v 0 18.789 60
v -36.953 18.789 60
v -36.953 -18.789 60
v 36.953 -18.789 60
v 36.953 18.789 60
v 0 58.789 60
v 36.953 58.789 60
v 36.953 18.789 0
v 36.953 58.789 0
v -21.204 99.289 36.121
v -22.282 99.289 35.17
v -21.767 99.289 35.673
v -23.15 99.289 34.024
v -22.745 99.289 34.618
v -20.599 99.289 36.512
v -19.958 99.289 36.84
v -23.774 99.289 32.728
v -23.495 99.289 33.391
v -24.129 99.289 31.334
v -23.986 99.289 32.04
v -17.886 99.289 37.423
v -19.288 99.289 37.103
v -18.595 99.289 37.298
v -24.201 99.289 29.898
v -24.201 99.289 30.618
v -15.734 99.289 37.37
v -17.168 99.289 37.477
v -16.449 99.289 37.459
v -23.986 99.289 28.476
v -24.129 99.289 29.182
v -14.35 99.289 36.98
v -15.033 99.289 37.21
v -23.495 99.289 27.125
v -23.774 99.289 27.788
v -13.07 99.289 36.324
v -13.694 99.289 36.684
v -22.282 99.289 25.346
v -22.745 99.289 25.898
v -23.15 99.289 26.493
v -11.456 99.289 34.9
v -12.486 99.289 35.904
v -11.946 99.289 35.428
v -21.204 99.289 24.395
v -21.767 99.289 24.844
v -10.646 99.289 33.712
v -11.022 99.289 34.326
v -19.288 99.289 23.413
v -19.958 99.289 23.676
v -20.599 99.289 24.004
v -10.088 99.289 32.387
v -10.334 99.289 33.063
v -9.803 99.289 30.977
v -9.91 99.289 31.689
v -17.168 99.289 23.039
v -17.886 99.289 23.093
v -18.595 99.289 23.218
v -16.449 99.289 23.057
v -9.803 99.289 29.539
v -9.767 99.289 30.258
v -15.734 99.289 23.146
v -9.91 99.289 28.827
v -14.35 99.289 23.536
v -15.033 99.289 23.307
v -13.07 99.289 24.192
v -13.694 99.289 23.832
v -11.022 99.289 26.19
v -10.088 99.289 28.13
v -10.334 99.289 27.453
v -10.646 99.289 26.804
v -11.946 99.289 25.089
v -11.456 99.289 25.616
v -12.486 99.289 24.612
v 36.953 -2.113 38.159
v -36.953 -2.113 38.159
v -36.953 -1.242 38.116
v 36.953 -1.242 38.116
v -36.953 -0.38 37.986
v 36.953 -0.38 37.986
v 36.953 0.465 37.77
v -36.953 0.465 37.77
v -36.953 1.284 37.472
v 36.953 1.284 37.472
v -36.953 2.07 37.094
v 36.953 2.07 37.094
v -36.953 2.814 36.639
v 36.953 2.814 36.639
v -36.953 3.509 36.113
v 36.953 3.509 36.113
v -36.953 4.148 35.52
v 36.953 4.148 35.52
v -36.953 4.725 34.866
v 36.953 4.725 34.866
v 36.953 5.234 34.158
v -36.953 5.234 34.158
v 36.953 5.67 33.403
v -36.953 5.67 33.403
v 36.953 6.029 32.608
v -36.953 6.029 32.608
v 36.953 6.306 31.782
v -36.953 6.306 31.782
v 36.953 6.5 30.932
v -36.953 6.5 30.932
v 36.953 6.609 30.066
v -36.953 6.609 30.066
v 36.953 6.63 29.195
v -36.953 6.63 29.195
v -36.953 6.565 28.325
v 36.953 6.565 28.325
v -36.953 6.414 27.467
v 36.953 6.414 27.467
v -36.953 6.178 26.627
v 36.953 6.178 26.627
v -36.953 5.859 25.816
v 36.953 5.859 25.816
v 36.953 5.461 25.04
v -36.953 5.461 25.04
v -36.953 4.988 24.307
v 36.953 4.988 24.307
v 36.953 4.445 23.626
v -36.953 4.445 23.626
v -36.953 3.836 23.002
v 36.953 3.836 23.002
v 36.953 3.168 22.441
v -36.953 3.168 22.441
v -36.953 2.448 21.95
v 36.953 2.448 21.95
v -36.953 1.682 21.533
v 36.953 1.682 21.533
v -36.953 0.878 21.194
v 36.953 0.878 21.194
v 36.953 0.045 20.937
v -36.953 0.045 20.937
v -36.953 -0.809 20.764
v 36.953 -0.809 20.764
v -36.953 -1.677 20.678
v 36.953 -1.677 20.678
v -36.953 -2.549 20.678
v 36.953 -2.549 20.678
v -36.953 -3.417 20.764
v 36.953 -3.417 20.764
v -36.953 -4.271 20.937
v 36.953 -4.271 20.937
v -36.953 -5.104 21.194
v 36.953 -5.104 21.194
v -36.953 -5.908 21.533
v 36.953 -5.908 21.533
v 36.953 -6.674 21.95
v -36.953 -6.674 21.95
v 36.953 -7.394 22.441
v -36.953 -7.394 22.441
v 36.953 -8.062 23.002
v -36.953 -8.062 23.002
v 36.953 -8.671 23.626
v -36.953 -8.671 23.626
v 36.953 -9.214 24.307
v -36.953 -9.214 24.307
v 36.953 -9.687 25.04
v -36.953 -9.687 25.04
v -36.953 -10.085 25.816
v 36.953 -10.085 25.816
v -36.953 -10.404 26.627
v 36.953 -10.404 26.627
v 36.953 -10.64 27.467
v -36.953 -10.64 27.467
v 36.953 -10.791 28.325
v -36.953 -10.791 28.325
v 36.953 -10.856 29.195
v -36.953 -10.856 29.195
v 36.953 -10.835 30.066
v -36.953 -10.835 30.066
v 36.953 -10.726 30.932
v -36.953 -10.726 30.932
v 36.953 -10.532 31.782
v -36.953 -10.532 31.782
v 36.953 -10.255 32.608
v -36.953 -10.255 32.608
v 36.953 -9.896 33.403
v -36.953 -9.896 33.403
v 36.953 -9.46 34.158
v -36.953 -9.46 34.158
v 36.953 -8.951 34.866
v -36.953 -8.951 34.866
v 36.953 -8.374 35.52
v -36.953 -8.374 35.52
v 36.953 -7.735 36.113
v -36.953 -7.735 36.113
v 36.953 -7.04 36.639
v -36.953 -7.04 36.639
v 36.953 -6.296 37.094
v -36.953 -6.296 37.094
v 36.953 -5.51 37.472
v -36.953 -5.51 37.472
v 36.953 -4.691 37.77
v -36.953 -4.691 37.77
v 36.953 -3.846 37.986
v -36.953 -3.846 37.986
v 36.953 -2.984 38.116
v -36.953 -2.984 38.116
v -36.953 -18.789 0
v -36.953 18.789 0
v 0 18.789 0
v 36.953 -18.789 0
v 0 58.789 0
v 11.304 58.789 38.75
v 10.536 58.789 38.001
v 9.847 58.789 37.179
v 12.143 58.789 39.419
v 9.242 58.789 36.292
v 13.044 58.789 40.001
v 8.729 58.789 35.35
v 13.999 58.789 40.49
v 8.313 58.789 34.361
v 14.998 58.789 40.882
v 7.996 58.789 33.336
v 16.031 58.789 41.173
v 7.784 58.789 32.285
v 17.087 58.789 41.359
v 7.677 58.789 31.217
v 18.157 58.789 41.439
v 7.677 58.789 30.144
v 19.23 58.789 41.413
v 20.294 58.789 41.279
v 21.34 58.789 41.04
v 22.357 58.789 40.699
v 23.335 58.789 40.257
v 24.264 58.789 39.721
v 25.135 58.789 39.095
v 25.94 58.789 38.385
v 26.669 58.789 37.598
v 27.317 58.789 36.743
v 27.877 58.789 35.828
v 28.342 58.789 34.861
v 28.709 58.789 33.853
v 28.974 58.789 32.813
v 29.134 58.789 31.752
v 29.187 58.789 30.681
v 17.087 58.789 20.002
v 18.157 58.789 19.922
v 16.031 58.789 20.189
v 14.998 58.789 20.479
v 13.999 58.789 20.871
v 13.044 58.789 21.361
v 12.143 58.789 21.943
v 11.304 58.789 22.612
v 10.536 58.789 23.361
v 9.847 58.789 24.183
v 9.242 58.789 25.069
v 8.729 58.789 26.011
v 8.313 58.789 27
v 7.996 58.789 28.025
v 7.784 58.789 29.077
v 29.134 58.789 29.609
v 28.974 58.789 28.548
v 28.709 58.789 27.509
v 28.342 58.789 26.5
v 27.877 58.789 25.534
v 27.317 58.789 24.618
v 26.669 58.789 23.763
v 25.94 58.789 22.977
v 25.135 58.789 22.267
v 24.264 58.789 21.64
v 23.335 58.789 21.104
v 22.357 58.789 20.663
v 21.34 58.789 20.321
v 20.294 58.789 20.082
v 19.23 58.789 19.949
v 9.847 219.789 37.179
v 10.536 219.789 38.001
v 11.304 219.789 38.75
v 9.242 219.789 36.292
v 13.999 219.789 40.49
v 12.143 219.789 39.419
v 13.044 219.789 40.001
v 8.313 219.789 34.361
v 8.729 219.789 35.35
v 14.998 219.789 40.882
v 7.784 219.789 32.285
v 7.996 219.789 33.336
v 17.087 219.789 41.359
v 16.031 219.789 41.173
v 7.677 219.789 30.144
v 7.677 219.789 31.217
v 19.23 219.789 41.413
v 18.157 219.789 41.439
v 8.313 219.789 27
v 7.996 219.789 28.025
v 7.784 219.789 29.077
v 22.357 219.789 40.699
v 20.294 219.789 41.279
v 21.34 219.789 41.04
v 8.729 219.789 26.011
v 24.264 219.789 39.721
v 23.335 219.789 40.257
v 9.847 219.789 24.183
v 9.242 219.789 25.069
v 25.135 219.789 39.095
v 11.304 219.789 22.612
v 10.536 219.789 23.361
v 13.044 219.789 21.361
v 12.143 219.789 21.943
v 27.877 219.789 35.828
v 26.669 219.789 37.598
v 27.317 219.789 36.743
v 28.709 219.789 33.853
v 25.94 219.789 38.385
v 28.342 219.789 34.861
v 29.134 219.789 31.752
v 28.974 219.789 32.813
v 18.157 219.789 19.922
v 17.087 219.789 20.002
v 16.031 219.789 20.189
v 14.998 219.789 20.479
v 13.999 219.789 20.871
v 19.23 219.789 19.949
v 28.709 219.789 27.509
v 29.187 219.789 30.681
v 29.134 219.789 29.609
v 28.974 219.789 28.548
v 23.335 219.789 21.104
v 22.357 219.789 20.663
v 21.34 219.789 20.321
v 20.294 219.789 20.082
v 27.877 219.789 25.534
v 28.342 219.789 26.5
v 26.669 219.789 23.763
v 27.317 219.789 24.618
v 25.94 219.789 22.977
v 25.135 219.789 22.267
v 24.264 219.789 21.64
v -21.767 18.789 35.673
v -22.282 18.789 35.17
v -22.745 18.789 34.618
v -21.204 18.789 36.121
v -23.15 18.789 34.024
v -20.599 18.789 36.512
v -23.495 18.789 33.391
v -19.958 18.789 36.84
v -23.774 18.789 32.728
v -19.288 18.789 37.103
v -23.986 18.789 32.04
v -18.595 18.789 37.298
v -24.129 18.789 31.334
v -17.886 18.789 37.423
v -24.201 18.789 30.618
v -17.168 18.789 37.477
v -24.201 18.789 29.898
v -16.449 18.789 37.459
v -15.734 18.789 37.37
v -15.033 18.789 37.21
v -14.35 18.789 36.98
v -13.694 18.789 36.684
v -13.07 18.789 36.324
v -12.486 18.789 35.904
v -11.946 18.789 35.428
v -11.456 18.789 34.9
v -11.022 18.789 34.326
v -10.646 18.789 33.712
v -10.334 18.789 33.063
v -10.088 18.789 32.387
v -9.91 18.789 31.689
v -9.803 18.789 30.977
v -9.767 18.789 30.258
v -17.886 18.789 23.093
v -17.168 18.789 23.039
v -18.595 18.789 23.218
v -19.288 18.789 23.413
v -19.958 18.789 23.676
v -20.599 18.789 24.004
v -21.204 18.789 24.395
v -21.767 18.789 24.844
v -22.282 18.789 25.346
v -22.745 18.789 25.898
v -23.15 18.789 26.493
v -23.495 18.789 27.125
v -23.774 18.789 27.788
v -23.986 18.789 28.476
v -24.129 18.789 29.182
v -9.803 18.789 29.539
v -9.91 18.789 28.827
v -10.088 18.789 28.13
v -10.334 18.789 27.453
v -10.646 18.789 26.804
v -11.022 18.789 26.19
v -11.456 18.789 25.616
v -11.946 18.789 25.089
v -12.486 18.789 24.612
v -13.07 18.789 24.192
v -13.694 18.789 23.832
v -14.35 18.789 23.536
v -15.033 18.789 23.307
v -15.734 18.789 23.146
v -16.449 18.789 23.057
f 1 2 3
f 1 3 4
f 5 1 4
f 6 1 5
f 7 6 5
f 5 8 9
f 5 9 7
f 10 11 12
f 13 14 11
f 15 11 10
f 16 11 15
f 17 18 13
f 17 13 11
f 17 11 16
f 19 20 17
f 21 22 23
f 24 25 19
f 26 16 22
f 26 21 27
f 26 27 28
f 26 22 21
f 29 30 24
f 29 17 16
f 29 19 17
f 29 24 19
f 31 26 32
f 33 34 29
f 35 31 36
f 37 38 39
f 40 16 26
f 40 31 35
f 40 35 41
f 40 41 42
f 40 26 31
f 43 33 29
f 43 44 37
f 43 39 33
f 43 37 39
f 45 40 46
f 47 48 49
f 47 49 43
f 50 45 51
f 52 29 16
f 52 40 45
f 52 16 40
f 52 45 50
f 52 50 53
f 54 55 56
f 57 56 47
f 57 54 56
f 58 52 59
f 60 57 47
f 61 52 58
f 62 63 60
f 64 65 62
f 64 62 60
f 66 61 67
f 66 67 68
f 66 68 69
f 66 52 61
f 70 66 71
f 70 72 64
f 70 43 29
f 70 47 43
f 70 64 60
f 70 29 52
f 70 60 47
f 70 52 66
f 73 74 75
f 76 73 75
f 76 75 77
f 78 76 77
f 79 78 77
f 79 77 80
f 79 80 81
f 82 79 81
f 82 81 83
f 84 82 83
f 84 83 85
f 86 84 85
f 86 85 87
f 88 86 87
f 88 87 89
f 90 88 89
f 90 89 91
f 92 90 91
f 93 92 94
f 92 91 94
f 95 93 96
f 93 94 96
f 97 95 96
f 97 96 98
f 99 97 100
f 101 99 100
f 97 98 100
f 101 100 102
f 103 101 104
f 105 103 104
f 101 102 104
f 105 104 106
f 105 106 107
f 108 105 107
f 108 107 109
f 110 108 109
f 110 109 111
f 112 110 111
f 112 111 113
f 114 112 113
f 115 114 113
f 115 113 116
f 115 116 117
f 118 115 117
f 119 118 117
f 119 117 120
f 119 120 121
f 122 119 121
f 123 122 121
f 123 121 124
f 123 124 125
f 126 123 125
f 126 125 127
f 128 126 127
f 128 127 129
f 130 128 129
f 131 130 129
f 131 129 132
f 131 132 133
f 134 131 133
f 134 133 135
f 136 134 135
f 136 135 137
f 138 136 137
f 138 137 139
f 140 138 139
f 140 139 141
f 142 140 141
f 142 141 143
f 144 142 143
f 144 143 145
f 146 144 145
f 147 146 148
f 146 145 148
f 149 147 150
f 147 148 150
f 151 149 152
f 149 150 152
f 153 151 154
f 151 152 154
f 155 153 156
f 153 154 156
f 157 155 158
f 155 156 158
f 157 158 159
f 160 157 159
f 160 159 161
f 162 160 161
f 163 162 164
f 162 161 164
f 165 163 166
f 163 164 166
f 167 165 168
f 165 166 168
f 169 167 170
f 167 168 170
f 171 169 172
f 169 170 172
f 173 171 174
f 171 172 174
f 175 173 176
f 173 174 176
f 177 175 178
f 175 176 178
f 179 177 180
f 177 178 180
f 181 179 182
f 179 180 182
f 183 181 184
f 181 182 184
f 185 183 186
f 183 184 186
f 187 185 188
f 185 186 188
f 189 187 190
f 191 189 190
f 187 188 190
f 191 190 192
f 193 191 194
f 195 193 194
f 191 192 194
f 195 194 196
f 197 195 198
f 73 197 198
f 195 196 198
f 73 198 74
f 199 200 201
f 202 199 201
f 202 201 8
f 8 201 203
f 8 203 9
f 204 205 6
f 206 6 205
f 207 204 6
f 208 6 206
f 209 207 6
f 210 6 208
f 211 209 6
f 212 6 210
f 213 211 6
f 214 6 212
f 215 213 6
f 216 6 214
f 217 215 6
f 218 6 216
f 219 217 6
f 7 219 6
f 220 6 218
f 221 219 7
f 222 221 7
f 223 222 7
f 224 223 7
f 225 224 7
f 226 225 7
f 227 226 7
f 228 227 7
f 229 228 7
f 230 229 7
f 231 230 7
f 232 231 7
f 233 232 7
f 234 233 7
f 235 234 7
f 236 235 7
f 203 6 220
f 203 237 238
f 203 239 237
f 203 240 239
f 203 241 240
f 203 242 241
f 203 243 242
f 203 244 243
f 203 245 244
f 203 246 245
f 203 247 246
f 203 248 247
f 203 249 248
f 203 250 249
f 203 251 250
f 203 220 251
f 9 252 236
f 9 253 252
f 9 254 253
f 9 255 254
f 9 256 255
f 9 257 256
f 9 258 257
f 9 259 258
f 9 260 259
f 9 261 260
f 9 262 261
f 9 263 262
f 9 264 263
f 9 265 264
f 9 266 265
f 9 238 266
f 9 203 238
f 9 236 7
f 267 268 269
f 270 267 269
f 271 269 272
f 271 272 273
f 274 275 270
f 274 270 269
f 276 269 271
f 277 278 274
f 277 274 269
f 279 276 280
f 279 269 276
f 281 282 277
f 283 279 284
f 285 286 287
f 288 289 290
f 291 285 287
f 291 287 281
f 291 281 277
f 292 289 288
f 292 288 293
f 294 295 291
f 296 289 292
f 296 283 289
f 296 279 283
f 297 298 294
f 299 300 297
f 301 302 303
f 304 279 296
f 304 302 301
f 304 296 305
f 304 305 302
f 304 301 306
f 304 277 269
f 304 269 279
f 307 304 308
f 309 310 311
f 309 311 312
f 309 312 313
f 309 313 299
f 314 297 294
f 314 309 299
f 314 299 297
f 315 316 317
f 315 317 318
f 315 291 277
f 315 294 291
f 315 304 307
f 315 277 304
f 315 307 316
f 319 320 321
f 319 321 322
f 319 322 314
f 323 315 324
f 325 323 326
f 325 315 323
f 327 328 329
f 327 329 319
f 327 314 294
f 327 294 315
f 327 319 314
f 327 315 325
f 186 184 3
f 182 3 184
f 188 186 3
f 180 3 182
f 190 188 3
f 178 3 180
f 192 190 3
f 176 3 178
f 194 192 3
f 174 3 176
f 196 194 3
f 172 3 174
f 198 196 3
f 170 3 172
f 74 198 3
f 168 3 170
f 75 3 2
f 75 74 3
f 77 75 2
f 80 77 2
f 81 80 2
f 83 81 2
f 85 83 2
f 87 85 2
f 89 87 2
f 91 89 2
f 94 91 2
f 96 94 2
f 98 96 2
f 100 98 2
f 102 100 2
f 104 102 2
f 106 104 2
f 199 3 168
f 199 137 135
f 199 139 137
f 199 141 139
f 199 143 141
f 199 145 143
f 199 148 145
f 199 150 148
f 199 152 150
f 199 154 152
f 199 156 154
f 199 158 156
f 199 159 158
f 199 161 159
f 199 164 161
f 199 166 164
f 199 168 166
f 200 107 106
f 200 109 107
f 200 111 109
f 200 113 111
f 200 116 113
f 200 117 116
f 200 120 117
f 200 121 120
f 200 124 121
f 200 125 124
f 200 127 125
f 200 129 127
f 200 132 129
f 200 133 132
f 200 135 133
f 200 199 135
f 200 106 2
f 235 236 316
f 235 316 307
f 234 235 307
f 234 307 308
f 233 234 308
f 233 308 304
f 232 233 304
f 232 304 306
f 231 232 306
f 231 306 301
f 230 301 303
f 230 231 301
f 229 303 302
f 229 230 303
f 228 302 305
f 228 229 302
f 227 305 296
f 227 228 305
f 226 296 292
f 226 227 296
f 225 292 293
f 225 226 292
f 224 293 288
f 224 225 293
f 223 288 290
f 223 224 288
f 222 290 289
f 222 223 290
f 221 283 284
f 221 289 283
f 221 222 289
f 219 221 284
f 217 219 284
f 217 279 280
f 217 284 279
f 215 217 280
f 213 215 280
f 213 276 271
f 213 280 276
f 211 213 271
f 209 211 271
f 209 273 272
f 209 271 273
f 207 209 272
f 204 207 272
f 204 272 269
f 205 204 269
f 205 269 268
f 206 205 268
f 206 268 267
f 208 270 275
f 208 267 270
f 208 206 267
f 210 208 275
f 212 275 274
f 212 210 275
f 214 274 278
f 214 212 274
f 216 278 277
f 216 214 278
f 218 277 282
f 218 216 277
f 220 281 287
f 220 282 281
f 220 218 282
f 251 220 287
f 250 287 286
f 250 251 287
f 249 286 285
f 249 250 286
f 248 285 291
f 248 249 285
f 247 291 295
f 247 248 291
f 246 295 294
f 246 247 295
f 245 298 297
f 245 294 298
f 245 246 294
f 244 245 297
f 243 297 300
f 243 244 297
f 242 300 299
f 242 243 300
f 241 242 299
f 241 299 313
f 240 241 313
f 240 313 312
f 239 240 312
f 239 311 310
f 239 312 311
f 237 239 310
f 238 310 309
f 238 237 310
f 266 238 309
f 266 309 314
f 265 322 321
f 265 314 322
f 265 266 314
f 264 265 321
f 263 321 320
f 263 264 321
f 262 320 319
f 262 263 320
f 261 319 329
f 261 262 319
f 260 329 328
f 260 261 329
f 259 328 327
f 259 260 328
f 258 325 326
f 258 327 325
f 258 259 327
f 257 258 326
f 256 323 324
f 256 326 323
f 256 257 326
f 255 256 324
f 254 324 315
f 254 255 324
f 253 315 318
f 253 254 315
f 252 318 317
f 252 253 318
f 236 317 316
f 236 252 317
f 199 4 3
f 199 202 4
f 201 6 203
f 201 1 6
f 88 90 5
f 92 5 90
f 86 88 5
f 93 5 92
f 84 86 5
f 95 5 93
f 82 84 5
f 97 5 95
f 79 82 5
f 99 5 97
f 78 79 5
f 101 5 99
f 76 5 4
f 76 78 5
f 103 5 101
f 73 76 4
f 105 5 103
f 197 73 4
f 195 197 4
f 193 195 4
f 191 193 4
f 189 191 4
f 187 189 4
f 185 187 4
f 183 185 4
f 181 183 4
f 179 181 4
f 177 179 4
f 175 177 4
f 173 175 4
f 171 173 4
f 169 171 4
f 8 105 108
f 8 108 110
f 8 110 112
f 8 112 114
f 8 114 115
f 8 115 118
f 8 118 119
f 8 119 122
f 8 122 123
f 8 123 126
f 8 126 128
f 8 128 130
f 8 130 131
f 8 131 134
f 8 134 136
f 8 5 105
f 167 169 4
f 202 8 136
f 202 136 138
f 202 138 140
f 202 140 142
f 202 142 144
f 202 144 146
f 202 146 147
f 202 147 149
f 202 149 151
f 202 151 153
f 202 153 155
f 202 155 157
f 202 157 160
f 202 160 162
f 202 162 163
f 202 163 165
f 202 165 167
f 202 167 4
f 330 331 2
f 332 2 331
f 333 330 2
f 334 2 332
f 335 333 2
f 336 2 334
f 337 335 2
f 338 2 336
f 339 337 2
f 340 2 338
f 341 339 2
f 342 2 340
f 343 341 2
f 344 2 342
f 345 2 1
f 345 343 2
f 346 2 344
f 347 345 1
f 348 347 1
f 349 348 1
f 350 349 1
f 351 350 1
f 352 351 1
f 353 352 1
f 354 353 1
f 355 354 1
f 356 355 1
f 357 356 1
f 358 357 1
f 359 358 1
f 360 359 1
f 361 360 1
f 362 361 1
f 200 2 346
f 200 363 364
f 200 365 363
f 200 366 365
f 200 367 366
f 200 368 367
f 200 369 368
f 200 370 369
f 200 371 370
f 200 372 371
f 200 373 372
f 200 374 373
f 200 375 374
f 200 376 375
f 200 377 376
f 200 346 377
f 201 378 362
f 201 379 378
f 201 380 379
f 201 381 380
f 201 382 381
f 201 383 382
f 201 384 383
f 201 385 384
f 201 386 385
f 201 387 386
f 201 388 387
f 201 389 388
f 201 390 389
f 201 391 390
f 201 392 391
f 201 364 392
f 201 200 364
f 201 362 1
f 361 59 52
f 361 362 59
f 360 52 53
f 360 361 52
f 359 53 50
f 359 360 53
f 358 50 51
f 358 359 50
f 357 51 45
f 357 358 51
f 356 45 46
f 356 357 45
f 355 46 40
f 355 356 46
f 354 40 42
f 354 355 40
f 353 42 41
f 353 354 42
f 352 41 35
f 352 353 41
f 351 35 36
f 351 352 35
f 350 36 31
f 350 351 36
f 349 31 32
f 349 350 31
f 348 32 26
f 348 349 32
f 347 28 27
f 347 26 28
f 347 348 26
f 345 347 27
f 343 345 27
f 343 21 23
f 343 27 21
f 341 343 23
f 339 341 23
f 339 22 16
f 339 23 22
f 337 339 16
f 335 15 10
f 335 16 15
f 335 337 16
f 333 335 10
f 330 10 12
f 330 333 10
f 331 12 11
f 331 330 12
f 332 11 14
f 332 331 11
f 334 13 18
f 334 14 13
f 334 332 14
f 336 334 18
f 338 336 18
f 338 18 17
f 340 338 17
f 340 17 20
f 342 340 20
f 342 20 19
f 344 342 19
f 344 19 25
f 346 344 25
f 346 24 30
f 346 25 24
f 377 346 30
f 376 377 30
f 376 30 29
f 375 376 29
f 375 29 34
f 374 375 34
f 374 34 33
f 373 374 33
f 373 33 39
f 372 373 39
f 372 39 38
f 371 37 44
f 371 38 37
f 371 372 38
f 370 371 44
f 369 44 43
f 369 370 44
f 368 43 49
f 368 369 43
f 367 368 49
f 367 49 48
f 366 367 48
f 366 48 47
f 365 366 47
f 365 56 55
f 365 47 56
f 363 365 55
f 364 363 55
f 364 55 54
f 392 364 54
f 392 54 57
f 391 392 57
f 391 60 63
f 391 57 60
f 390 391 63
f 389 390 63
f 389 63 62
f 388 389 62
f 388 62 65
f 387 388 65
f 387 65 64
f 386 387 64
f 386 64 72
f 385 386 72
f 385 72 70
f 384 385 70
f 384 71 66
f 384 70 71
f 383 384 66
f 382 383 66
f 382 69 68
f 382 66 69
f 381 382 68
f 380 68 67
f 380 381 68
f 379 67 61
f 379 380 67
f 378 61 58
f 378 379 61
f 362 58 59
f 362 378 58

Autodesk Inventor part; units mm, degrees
ref_plane "YZ Plane" through (0, 0, 0) normal (1, 0, 0) x (0, 1, 0)
ref_plane "XZ Plane" through (0, 0, 0) normal (0, 1, 0) x (-1, 0, 0)
ref_plane "XY Plane" through (0, 0, 0) normal (0, 0, 1) x (1, 0, 0)
sketch "스케치1" plane through (0, 0, 0) normal (0, 0, 1) x (1, 0, 0)
  line L0 (36.9529, -18.7887) -> (-36.9529, -18.7887)
  line L1 (-36.9529, -18.7887) -> (-36.9529, 18.7887)
  line L2 (-36.9529, 18.7887) -> (36.9529, 18.7887)
  line L3 (36.9529, 18.7887) -> (36.9529, -18.7887)
  line L4 (36.9529, -18.7887) -> (-36.9529, 18.7887) construction
  line L5 (-36.9529, -18.7887) -> (36.9529, 18.7887) construction
  point P0 (0, 0)
extrude "돌출1" add sketch "스케치1" along normal blind 60
sketch "스케치2" plane through (-36.9529, 18.7887, 0) normal (0, 1, 0) x (1, 0, 0)
  line L0 (73.9059, 0) -> (73.9059, -60) projected
  line L1 (36.9529, 0) -> (73.9059, 0)
  line L2 (73.9059, 0) -> (73.9059, -60)
  line L3 (73.9059, -60) -> (36.9529, -60)
  line L4 (36.9529, -60) -> (36.9529, 0)
  circle A0 centre (55.4294, -30) radius 7.9669
extrude "돌출2" add sketch "스케치2" along normal blind 40 contours L0 L3 L4 L1 | A0
sketch "스케치3" plane through (-36.9529, 18.7887, 60) normal (0, 1, 0) x (1, 0, 0)
  circle A0 centre (19.9645, 29.7419) radius 7.2214
  point P0 (36.9529, 60)
extrude "돌출3" add sketch "스케치3" along normal blind 80.5
sketch "스케치4" plane through (-36.9529, 58.7887, 0) normal (0, 1, 0) x (1, 0, 0)
  circle A0 centre (55.3783, -30.6807) radius 10.7619
  point P0 (36.9529, 0)
extrude "돌출4" add sketch "스케치4" along normal blind 161
sketch "스케치5" plane through (-36.9529, -18.7887, 0) normal (-1, 0, 0) x (0, 0, 1)
  circle A0 centre (29.4129, 16.6757) radius 8.7461
  point P0 (0, 18.7887)
extrude "돌출5" cut sketch "스케치5" against normal blind 80.5
properties part number "240503_3Dsketch01"
